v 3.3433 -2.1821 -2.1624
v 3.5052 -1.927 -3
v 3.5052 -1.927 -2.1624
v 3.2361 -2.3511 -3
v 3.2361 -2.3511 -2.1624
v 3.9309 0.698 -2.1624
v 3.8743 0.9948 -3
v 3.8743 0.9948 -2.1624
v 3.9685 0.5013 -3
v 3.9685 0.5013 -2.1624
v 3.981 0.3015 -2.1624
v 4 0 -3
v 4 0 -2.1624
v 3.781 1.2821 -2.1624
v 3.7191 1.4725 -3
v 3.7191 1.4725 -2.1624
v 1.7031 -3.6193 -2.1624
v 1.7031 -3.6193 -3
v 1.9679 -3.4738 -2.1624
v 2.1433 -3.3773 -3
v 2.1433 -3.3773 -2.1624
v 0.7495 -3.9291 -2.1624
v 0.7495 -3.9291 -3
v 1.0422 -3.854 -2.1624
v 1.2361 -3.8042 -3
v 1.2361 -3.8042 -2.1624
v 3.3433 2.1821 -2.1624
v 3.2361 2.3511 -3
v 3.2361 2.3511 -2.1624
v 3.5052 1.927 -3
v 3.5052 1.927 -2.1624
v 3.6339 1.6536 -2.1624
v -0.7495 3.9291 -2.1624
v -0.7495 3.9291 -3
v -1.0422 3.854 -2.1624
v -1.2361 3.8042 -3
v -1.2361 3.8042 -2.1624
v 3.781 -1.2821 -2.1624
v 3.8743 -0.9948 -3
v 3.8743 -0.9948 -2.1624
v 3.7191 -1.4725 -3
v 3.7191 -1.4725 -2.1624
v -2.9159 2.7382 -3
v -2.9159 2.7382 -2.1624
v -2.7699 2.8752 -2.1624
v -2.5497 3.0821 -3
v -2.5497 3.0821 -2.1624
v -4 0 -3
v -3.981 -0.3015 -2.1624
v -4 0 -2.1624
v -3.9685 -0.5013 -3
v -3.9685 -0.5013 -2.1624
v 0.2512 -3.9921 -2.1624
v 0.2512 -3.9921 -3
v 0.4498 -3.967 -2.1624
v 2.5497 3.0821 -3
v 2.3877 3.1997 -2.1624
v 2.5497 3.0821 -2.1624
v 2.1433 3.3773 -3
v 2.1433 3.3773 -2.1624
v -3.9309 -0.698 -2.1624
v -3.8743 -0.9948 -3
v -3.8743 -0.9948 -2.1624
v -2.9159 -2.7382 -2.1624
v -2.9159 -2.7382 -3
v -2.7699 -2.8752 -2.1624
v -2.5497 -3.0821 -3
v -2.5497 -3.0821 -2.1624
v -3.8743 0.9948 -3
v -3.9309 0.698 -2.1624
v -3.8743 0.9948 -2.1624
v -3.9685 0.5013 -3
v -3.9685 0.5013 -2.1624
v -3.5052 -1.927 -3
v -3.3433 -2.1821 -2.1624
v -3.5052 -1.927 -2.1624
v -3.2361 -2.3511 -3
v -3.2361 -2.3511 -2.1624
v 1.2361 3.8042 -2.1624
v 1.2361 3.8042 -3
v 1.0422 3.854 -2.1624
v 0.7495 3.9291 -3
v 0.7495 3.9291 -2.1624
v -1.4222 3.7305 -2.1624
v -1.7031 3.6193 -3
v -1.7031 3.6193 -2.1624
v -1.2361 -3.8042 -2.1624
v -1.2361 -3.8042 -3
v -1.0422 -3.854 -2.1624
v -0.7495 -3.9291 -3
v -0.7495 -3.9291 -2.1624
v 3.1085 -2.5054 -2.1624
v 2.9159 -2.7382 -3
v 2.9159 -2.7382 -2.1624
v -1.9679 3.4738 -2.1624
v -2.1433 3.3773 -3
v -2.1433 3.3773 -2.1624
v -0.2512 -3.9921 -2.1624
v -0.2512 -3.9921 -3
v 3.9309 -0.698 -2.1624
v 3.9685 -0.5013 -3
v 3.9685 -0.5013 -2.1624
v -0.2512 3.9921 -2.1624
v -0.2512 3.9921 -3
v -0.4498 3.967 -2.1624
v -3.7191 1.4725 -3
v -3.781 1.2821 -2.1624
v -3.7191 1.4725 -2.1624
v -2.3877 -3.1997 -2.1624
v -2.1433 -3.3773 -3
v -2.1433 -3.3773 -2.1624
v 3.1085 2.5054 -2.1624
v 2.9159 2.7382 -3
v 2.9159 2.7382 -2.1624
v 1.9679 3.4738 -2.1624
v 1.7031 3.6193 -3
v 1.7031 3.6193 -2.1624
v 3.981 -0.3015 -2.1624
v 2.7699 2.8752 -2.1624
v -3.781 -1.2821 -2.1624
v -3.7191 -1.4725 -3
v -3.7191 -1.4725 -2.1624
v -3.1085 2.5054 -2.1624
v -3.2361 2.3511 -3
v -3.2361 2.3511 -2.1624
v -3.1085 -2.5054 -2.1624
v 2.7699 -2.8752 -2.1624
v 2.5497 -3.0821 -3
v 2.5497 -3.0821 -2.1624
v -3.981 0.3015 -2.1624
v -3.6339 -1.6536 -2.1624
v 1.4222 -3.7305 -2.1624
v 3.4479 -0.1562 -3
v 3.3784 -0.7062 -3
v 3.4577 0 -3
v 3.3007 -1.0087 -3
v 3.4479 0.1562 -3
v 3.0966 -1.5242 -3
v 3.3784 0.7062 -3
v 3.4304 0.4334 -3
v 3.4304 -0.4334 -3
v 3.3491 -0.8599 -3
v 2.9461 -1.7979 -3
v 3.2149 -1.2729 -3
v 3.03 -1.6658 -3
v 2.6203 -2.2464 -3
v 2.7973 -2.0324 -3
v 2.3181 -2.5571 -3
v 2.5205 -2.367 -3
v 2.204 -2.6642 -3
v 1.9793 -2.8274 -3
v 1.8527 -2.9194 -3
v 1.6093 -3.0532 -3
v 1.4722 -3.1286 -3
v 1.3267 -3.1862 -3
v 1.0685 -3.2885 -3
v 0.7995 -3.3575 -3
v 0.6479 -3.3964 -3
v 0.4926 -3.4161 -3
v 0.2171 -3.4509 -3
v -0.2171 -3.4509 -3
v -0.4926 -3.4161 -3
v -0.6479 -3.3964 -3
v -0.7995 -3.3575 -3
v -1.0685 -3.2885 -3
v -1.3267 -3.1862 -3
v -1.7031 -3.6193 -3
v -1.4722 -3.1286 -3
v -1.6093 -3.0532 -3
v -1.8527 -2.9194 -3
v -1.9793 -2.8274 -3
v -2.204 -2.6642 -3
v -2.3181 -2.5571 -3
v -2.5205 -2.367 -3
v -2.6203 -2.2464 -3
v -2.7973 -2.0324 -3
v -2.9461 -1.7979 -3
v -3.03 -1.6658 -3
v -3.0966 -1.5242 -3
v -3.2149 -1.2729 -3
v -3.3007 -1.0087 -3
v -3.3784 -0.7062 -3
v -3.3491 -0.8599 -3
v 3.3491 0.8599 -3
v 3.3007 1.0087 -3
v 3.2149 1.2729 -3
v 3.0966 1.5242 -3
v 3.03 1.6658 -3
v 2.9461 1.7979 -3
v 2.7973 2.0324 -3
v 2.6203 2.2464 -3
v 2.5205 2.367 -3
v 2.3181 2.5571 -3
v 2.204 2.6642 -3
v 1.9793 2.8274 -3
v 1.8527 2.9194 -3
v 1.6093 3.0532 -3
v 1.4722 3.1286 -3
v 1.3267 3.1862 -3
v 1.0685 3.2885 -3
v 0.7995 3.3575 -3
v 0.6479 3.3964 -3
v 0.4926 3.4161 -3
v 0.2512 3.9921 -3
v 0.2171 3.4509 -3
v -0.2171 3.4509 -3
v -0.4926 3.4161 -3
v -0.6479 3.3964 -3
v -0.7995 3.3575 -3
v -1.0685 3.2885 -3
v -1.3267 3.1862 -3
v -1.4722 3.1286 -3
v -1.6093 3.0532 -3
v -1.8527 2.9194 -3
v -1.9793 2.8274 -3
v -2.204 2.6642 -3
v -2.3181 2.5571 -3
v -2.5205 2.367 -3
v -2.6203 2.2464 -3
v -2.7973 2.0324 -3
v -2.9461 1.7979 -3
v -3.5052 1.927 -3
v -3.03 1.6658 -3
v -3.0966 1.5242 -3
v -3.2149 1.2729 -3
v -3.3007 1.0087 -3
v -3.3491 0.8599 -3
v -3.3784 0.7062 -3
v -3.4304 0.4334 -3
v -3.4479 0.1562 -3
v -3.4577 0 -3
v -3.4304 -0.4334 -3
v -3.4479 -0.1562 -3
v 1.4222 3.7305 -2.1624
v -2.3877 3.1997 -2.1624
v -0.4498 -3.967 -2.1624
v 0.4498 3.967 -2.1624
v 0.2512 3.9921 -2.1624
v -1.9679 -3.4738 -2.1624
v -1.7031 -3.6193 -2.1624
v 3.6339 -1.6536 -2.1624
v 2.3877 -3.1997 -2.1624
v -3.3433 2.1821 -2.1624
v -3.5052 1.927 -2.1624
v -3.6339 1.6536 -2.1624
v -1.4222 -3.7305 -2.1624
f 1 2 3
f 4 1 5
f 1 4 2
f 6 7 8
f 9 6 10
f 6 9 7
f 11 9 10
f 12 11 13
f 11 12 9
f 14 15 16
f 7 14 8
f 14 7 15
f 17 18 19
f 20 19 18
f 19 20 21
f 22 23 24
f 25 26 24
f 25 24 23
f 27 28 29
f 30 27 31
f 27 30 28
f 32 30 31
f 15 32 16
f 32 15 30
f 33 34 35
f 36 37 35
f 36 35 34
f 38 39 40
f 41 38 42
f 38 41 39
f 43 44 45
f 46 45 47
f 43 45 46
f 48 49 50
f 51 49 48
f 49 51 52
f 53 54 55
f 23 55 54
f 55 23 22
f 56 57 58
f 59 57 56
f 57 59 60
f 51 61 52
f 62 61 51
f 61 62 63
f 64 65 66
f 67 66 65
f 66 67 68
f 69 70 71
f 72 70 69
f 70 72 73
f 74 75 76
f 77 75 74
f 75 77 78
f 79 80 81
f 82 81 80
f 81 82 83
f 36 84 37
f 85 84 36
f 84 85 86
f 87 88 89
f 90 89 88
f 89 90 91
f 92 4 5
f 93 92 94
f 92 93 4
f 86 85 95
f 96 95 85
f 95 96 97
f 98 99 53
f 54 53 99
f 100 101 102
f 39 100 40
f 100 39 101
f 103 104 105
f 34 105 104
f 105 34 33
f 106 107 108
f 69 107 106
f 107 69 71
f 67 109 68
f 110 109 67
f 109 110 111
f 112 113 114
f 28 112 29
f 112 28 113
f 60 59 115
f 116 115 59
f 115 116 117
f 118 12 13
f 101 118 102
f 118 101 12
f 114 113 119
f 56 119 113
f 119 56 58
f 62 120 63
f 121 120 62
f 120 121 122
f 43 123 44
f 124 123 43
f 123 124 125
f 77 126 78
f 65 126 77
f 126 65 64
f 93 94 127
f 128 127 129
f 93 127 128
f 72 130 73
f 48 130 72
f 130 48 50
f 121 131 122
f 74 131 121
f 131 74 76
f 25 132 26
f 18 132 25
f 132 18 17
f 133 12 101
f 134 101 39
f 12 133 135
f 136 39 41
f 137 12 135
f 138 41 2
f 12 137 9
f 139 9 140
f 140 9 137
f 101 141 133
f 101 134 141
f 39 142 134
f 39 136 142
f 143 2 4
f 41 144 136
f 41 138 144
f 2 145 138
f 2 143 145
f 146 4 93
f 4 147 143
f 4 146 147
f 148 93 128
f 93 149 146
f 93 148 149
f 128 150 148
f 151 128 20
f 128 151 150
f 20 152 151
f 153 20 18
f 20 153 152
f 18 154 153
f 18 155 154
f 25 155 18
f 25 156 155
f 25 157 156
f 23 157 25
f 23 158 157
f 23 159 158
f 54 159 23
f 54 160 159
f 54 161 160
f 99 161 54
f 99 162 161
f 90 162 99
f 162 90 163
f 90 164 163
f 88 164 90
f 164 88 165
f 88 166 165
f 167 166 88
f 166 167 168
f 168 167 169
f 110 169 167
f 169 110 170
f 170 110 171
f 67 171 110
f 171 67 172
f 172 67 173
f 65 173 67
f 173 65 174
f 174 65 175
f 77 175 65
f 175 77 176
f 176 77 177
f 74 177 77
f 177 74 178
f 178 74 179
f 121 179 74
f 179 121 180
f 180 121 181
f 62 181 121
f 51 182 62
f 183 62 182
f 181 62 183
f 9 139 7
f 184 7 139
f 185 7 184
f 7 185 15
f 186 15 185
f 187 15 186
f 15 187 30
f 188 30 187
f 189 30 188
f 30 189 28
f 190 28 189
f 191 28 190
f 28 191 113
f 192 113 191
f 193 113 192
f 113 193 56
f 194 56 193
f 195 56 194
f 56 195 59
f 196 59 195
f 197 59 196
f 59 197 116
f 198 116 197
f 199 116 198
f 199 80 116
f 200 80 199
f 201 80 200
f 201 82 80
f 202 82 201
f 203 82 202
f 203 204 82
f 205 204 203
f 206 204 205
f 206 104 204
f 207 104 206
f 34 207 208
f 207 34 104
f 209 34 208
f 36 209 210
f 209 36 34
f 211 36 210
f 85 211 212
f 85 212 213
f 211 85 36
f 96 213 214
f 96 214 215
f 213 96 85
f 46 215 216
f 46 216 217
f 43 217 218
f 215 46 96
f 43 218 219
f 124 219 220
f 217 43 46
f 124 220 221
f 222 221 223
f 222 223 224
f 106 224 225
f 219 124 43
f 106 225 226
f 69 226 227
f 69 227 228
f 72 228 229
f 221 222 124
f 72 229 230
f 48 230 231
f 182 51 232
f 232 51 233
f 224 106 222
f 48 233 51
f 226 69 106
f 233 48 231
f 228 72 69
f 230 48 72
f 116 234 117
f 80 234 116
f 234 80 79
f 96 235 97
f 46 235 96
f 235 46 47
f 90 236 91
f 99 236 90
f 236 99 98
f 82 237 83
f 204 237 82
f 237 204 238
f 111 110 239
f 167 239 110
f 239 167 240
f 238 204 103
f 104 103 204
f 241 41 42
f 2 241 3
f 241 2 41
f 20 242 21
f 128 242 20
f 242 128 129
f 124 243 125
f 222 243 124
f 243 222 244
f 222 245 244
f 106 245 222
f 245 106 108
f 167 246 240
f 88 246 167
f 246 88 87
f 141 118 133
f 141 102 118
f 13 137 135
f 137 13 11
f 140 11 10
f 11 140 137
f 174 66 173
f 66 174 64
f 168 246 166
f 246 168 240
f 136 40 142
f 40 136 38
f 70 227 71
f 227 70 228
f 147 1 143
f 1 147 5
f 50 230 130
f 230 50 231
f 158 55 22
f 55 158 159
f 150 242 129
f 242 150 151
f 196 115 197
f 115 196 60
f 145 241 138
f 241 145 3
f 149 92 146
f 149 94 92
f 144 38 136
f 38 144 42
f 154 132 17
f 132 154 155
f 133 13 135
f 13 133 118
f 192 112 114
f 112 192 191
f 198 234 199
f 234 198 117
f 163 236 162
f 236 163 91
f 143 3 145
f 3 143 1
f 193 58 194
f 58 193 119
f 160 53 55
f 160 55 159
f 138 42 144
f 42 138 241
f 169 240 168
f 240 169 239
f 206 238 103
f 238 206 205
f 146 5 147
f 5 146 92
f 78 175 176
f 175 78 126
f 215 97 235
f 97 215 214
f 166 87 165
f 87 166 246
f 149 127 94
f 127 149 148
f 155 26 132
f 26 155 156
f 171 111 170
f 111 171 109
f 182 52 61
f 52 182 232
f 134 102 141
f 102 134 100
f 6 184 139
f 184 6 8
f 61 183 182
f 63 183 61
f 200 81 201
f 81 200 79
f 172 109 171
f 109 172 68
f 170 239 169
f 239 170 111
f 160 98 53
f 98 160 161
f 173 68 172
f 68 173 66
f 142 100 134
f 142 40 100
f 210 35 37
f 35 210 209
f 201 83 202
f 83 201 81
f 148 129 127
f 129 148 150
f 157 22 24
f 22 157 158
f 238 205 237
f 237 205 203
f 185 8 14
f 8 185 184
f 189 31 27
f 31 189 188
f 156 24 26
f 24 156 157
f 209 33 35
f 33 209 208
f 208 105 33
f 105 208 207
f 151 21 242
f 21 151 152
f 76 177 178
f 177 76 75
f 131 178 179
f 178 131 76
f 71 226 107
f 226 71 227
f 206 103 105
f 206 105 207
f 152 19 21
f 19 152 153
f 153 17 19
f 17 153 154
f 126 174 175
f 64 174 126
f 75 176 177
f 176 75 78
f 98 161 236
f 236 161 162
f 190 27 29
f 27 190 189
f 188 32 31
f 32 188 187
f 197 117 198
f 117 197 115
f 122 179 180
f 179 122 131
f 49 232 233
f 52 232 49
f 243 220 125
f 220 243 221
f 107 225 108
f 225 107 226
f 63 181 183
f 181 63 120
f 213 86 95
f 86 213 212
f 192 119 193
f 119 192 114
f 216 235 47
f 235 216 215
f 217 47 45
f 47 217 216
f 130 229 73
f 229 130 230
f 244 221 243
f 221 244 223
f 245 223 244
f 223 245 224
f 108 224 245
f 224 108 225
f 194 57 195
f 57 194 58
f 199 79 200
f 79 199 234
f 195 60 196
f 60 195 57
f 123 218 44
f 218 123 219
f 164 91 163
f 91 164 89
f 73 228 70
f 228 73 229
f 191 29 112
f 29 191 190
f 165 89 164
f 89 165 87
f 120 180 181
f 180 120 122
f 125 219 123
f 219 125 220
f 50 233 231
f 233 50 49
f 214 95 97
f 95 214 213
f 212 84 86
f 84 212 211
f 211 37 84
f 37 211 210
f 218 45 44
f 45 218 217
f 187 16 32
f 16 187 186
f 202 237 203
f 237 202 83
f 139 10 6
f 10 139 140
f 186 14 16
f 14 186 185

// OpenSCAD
$fn = 50;

difference() {
	union() {
		translate(v = [0, 0, -3.0]) {
			cylinder(h = 3, r = 4.0);
		}
		#translate(v = [0, 0, -6.0]) {
			cylinder(h = 6, r = 2.875);
		}
	}
	union() {
		translate(v = [0, 0, 0]) {
			rotate(a = [0, 0, 0]) {
				difference() {
					union() {
						translate(v = [0, 0, -6.0]) {
							cylinder(h = 6, r = 2.6);
						}
						translate(v = [0, 0, -3.9]) {
							cylinder(h = 3.9, r1 = 2.875, r2 = 5.4);
						}
						translate(v = [0, 0, -6.0]) {
							cylinder(h = 6, r = 2.875);
						}
						translate(v = [0, 0, -6.0]) {
							cylinder(h = 6, r = 2.6);
						}
					}
					union();
				}
			}
		}
	}
}
